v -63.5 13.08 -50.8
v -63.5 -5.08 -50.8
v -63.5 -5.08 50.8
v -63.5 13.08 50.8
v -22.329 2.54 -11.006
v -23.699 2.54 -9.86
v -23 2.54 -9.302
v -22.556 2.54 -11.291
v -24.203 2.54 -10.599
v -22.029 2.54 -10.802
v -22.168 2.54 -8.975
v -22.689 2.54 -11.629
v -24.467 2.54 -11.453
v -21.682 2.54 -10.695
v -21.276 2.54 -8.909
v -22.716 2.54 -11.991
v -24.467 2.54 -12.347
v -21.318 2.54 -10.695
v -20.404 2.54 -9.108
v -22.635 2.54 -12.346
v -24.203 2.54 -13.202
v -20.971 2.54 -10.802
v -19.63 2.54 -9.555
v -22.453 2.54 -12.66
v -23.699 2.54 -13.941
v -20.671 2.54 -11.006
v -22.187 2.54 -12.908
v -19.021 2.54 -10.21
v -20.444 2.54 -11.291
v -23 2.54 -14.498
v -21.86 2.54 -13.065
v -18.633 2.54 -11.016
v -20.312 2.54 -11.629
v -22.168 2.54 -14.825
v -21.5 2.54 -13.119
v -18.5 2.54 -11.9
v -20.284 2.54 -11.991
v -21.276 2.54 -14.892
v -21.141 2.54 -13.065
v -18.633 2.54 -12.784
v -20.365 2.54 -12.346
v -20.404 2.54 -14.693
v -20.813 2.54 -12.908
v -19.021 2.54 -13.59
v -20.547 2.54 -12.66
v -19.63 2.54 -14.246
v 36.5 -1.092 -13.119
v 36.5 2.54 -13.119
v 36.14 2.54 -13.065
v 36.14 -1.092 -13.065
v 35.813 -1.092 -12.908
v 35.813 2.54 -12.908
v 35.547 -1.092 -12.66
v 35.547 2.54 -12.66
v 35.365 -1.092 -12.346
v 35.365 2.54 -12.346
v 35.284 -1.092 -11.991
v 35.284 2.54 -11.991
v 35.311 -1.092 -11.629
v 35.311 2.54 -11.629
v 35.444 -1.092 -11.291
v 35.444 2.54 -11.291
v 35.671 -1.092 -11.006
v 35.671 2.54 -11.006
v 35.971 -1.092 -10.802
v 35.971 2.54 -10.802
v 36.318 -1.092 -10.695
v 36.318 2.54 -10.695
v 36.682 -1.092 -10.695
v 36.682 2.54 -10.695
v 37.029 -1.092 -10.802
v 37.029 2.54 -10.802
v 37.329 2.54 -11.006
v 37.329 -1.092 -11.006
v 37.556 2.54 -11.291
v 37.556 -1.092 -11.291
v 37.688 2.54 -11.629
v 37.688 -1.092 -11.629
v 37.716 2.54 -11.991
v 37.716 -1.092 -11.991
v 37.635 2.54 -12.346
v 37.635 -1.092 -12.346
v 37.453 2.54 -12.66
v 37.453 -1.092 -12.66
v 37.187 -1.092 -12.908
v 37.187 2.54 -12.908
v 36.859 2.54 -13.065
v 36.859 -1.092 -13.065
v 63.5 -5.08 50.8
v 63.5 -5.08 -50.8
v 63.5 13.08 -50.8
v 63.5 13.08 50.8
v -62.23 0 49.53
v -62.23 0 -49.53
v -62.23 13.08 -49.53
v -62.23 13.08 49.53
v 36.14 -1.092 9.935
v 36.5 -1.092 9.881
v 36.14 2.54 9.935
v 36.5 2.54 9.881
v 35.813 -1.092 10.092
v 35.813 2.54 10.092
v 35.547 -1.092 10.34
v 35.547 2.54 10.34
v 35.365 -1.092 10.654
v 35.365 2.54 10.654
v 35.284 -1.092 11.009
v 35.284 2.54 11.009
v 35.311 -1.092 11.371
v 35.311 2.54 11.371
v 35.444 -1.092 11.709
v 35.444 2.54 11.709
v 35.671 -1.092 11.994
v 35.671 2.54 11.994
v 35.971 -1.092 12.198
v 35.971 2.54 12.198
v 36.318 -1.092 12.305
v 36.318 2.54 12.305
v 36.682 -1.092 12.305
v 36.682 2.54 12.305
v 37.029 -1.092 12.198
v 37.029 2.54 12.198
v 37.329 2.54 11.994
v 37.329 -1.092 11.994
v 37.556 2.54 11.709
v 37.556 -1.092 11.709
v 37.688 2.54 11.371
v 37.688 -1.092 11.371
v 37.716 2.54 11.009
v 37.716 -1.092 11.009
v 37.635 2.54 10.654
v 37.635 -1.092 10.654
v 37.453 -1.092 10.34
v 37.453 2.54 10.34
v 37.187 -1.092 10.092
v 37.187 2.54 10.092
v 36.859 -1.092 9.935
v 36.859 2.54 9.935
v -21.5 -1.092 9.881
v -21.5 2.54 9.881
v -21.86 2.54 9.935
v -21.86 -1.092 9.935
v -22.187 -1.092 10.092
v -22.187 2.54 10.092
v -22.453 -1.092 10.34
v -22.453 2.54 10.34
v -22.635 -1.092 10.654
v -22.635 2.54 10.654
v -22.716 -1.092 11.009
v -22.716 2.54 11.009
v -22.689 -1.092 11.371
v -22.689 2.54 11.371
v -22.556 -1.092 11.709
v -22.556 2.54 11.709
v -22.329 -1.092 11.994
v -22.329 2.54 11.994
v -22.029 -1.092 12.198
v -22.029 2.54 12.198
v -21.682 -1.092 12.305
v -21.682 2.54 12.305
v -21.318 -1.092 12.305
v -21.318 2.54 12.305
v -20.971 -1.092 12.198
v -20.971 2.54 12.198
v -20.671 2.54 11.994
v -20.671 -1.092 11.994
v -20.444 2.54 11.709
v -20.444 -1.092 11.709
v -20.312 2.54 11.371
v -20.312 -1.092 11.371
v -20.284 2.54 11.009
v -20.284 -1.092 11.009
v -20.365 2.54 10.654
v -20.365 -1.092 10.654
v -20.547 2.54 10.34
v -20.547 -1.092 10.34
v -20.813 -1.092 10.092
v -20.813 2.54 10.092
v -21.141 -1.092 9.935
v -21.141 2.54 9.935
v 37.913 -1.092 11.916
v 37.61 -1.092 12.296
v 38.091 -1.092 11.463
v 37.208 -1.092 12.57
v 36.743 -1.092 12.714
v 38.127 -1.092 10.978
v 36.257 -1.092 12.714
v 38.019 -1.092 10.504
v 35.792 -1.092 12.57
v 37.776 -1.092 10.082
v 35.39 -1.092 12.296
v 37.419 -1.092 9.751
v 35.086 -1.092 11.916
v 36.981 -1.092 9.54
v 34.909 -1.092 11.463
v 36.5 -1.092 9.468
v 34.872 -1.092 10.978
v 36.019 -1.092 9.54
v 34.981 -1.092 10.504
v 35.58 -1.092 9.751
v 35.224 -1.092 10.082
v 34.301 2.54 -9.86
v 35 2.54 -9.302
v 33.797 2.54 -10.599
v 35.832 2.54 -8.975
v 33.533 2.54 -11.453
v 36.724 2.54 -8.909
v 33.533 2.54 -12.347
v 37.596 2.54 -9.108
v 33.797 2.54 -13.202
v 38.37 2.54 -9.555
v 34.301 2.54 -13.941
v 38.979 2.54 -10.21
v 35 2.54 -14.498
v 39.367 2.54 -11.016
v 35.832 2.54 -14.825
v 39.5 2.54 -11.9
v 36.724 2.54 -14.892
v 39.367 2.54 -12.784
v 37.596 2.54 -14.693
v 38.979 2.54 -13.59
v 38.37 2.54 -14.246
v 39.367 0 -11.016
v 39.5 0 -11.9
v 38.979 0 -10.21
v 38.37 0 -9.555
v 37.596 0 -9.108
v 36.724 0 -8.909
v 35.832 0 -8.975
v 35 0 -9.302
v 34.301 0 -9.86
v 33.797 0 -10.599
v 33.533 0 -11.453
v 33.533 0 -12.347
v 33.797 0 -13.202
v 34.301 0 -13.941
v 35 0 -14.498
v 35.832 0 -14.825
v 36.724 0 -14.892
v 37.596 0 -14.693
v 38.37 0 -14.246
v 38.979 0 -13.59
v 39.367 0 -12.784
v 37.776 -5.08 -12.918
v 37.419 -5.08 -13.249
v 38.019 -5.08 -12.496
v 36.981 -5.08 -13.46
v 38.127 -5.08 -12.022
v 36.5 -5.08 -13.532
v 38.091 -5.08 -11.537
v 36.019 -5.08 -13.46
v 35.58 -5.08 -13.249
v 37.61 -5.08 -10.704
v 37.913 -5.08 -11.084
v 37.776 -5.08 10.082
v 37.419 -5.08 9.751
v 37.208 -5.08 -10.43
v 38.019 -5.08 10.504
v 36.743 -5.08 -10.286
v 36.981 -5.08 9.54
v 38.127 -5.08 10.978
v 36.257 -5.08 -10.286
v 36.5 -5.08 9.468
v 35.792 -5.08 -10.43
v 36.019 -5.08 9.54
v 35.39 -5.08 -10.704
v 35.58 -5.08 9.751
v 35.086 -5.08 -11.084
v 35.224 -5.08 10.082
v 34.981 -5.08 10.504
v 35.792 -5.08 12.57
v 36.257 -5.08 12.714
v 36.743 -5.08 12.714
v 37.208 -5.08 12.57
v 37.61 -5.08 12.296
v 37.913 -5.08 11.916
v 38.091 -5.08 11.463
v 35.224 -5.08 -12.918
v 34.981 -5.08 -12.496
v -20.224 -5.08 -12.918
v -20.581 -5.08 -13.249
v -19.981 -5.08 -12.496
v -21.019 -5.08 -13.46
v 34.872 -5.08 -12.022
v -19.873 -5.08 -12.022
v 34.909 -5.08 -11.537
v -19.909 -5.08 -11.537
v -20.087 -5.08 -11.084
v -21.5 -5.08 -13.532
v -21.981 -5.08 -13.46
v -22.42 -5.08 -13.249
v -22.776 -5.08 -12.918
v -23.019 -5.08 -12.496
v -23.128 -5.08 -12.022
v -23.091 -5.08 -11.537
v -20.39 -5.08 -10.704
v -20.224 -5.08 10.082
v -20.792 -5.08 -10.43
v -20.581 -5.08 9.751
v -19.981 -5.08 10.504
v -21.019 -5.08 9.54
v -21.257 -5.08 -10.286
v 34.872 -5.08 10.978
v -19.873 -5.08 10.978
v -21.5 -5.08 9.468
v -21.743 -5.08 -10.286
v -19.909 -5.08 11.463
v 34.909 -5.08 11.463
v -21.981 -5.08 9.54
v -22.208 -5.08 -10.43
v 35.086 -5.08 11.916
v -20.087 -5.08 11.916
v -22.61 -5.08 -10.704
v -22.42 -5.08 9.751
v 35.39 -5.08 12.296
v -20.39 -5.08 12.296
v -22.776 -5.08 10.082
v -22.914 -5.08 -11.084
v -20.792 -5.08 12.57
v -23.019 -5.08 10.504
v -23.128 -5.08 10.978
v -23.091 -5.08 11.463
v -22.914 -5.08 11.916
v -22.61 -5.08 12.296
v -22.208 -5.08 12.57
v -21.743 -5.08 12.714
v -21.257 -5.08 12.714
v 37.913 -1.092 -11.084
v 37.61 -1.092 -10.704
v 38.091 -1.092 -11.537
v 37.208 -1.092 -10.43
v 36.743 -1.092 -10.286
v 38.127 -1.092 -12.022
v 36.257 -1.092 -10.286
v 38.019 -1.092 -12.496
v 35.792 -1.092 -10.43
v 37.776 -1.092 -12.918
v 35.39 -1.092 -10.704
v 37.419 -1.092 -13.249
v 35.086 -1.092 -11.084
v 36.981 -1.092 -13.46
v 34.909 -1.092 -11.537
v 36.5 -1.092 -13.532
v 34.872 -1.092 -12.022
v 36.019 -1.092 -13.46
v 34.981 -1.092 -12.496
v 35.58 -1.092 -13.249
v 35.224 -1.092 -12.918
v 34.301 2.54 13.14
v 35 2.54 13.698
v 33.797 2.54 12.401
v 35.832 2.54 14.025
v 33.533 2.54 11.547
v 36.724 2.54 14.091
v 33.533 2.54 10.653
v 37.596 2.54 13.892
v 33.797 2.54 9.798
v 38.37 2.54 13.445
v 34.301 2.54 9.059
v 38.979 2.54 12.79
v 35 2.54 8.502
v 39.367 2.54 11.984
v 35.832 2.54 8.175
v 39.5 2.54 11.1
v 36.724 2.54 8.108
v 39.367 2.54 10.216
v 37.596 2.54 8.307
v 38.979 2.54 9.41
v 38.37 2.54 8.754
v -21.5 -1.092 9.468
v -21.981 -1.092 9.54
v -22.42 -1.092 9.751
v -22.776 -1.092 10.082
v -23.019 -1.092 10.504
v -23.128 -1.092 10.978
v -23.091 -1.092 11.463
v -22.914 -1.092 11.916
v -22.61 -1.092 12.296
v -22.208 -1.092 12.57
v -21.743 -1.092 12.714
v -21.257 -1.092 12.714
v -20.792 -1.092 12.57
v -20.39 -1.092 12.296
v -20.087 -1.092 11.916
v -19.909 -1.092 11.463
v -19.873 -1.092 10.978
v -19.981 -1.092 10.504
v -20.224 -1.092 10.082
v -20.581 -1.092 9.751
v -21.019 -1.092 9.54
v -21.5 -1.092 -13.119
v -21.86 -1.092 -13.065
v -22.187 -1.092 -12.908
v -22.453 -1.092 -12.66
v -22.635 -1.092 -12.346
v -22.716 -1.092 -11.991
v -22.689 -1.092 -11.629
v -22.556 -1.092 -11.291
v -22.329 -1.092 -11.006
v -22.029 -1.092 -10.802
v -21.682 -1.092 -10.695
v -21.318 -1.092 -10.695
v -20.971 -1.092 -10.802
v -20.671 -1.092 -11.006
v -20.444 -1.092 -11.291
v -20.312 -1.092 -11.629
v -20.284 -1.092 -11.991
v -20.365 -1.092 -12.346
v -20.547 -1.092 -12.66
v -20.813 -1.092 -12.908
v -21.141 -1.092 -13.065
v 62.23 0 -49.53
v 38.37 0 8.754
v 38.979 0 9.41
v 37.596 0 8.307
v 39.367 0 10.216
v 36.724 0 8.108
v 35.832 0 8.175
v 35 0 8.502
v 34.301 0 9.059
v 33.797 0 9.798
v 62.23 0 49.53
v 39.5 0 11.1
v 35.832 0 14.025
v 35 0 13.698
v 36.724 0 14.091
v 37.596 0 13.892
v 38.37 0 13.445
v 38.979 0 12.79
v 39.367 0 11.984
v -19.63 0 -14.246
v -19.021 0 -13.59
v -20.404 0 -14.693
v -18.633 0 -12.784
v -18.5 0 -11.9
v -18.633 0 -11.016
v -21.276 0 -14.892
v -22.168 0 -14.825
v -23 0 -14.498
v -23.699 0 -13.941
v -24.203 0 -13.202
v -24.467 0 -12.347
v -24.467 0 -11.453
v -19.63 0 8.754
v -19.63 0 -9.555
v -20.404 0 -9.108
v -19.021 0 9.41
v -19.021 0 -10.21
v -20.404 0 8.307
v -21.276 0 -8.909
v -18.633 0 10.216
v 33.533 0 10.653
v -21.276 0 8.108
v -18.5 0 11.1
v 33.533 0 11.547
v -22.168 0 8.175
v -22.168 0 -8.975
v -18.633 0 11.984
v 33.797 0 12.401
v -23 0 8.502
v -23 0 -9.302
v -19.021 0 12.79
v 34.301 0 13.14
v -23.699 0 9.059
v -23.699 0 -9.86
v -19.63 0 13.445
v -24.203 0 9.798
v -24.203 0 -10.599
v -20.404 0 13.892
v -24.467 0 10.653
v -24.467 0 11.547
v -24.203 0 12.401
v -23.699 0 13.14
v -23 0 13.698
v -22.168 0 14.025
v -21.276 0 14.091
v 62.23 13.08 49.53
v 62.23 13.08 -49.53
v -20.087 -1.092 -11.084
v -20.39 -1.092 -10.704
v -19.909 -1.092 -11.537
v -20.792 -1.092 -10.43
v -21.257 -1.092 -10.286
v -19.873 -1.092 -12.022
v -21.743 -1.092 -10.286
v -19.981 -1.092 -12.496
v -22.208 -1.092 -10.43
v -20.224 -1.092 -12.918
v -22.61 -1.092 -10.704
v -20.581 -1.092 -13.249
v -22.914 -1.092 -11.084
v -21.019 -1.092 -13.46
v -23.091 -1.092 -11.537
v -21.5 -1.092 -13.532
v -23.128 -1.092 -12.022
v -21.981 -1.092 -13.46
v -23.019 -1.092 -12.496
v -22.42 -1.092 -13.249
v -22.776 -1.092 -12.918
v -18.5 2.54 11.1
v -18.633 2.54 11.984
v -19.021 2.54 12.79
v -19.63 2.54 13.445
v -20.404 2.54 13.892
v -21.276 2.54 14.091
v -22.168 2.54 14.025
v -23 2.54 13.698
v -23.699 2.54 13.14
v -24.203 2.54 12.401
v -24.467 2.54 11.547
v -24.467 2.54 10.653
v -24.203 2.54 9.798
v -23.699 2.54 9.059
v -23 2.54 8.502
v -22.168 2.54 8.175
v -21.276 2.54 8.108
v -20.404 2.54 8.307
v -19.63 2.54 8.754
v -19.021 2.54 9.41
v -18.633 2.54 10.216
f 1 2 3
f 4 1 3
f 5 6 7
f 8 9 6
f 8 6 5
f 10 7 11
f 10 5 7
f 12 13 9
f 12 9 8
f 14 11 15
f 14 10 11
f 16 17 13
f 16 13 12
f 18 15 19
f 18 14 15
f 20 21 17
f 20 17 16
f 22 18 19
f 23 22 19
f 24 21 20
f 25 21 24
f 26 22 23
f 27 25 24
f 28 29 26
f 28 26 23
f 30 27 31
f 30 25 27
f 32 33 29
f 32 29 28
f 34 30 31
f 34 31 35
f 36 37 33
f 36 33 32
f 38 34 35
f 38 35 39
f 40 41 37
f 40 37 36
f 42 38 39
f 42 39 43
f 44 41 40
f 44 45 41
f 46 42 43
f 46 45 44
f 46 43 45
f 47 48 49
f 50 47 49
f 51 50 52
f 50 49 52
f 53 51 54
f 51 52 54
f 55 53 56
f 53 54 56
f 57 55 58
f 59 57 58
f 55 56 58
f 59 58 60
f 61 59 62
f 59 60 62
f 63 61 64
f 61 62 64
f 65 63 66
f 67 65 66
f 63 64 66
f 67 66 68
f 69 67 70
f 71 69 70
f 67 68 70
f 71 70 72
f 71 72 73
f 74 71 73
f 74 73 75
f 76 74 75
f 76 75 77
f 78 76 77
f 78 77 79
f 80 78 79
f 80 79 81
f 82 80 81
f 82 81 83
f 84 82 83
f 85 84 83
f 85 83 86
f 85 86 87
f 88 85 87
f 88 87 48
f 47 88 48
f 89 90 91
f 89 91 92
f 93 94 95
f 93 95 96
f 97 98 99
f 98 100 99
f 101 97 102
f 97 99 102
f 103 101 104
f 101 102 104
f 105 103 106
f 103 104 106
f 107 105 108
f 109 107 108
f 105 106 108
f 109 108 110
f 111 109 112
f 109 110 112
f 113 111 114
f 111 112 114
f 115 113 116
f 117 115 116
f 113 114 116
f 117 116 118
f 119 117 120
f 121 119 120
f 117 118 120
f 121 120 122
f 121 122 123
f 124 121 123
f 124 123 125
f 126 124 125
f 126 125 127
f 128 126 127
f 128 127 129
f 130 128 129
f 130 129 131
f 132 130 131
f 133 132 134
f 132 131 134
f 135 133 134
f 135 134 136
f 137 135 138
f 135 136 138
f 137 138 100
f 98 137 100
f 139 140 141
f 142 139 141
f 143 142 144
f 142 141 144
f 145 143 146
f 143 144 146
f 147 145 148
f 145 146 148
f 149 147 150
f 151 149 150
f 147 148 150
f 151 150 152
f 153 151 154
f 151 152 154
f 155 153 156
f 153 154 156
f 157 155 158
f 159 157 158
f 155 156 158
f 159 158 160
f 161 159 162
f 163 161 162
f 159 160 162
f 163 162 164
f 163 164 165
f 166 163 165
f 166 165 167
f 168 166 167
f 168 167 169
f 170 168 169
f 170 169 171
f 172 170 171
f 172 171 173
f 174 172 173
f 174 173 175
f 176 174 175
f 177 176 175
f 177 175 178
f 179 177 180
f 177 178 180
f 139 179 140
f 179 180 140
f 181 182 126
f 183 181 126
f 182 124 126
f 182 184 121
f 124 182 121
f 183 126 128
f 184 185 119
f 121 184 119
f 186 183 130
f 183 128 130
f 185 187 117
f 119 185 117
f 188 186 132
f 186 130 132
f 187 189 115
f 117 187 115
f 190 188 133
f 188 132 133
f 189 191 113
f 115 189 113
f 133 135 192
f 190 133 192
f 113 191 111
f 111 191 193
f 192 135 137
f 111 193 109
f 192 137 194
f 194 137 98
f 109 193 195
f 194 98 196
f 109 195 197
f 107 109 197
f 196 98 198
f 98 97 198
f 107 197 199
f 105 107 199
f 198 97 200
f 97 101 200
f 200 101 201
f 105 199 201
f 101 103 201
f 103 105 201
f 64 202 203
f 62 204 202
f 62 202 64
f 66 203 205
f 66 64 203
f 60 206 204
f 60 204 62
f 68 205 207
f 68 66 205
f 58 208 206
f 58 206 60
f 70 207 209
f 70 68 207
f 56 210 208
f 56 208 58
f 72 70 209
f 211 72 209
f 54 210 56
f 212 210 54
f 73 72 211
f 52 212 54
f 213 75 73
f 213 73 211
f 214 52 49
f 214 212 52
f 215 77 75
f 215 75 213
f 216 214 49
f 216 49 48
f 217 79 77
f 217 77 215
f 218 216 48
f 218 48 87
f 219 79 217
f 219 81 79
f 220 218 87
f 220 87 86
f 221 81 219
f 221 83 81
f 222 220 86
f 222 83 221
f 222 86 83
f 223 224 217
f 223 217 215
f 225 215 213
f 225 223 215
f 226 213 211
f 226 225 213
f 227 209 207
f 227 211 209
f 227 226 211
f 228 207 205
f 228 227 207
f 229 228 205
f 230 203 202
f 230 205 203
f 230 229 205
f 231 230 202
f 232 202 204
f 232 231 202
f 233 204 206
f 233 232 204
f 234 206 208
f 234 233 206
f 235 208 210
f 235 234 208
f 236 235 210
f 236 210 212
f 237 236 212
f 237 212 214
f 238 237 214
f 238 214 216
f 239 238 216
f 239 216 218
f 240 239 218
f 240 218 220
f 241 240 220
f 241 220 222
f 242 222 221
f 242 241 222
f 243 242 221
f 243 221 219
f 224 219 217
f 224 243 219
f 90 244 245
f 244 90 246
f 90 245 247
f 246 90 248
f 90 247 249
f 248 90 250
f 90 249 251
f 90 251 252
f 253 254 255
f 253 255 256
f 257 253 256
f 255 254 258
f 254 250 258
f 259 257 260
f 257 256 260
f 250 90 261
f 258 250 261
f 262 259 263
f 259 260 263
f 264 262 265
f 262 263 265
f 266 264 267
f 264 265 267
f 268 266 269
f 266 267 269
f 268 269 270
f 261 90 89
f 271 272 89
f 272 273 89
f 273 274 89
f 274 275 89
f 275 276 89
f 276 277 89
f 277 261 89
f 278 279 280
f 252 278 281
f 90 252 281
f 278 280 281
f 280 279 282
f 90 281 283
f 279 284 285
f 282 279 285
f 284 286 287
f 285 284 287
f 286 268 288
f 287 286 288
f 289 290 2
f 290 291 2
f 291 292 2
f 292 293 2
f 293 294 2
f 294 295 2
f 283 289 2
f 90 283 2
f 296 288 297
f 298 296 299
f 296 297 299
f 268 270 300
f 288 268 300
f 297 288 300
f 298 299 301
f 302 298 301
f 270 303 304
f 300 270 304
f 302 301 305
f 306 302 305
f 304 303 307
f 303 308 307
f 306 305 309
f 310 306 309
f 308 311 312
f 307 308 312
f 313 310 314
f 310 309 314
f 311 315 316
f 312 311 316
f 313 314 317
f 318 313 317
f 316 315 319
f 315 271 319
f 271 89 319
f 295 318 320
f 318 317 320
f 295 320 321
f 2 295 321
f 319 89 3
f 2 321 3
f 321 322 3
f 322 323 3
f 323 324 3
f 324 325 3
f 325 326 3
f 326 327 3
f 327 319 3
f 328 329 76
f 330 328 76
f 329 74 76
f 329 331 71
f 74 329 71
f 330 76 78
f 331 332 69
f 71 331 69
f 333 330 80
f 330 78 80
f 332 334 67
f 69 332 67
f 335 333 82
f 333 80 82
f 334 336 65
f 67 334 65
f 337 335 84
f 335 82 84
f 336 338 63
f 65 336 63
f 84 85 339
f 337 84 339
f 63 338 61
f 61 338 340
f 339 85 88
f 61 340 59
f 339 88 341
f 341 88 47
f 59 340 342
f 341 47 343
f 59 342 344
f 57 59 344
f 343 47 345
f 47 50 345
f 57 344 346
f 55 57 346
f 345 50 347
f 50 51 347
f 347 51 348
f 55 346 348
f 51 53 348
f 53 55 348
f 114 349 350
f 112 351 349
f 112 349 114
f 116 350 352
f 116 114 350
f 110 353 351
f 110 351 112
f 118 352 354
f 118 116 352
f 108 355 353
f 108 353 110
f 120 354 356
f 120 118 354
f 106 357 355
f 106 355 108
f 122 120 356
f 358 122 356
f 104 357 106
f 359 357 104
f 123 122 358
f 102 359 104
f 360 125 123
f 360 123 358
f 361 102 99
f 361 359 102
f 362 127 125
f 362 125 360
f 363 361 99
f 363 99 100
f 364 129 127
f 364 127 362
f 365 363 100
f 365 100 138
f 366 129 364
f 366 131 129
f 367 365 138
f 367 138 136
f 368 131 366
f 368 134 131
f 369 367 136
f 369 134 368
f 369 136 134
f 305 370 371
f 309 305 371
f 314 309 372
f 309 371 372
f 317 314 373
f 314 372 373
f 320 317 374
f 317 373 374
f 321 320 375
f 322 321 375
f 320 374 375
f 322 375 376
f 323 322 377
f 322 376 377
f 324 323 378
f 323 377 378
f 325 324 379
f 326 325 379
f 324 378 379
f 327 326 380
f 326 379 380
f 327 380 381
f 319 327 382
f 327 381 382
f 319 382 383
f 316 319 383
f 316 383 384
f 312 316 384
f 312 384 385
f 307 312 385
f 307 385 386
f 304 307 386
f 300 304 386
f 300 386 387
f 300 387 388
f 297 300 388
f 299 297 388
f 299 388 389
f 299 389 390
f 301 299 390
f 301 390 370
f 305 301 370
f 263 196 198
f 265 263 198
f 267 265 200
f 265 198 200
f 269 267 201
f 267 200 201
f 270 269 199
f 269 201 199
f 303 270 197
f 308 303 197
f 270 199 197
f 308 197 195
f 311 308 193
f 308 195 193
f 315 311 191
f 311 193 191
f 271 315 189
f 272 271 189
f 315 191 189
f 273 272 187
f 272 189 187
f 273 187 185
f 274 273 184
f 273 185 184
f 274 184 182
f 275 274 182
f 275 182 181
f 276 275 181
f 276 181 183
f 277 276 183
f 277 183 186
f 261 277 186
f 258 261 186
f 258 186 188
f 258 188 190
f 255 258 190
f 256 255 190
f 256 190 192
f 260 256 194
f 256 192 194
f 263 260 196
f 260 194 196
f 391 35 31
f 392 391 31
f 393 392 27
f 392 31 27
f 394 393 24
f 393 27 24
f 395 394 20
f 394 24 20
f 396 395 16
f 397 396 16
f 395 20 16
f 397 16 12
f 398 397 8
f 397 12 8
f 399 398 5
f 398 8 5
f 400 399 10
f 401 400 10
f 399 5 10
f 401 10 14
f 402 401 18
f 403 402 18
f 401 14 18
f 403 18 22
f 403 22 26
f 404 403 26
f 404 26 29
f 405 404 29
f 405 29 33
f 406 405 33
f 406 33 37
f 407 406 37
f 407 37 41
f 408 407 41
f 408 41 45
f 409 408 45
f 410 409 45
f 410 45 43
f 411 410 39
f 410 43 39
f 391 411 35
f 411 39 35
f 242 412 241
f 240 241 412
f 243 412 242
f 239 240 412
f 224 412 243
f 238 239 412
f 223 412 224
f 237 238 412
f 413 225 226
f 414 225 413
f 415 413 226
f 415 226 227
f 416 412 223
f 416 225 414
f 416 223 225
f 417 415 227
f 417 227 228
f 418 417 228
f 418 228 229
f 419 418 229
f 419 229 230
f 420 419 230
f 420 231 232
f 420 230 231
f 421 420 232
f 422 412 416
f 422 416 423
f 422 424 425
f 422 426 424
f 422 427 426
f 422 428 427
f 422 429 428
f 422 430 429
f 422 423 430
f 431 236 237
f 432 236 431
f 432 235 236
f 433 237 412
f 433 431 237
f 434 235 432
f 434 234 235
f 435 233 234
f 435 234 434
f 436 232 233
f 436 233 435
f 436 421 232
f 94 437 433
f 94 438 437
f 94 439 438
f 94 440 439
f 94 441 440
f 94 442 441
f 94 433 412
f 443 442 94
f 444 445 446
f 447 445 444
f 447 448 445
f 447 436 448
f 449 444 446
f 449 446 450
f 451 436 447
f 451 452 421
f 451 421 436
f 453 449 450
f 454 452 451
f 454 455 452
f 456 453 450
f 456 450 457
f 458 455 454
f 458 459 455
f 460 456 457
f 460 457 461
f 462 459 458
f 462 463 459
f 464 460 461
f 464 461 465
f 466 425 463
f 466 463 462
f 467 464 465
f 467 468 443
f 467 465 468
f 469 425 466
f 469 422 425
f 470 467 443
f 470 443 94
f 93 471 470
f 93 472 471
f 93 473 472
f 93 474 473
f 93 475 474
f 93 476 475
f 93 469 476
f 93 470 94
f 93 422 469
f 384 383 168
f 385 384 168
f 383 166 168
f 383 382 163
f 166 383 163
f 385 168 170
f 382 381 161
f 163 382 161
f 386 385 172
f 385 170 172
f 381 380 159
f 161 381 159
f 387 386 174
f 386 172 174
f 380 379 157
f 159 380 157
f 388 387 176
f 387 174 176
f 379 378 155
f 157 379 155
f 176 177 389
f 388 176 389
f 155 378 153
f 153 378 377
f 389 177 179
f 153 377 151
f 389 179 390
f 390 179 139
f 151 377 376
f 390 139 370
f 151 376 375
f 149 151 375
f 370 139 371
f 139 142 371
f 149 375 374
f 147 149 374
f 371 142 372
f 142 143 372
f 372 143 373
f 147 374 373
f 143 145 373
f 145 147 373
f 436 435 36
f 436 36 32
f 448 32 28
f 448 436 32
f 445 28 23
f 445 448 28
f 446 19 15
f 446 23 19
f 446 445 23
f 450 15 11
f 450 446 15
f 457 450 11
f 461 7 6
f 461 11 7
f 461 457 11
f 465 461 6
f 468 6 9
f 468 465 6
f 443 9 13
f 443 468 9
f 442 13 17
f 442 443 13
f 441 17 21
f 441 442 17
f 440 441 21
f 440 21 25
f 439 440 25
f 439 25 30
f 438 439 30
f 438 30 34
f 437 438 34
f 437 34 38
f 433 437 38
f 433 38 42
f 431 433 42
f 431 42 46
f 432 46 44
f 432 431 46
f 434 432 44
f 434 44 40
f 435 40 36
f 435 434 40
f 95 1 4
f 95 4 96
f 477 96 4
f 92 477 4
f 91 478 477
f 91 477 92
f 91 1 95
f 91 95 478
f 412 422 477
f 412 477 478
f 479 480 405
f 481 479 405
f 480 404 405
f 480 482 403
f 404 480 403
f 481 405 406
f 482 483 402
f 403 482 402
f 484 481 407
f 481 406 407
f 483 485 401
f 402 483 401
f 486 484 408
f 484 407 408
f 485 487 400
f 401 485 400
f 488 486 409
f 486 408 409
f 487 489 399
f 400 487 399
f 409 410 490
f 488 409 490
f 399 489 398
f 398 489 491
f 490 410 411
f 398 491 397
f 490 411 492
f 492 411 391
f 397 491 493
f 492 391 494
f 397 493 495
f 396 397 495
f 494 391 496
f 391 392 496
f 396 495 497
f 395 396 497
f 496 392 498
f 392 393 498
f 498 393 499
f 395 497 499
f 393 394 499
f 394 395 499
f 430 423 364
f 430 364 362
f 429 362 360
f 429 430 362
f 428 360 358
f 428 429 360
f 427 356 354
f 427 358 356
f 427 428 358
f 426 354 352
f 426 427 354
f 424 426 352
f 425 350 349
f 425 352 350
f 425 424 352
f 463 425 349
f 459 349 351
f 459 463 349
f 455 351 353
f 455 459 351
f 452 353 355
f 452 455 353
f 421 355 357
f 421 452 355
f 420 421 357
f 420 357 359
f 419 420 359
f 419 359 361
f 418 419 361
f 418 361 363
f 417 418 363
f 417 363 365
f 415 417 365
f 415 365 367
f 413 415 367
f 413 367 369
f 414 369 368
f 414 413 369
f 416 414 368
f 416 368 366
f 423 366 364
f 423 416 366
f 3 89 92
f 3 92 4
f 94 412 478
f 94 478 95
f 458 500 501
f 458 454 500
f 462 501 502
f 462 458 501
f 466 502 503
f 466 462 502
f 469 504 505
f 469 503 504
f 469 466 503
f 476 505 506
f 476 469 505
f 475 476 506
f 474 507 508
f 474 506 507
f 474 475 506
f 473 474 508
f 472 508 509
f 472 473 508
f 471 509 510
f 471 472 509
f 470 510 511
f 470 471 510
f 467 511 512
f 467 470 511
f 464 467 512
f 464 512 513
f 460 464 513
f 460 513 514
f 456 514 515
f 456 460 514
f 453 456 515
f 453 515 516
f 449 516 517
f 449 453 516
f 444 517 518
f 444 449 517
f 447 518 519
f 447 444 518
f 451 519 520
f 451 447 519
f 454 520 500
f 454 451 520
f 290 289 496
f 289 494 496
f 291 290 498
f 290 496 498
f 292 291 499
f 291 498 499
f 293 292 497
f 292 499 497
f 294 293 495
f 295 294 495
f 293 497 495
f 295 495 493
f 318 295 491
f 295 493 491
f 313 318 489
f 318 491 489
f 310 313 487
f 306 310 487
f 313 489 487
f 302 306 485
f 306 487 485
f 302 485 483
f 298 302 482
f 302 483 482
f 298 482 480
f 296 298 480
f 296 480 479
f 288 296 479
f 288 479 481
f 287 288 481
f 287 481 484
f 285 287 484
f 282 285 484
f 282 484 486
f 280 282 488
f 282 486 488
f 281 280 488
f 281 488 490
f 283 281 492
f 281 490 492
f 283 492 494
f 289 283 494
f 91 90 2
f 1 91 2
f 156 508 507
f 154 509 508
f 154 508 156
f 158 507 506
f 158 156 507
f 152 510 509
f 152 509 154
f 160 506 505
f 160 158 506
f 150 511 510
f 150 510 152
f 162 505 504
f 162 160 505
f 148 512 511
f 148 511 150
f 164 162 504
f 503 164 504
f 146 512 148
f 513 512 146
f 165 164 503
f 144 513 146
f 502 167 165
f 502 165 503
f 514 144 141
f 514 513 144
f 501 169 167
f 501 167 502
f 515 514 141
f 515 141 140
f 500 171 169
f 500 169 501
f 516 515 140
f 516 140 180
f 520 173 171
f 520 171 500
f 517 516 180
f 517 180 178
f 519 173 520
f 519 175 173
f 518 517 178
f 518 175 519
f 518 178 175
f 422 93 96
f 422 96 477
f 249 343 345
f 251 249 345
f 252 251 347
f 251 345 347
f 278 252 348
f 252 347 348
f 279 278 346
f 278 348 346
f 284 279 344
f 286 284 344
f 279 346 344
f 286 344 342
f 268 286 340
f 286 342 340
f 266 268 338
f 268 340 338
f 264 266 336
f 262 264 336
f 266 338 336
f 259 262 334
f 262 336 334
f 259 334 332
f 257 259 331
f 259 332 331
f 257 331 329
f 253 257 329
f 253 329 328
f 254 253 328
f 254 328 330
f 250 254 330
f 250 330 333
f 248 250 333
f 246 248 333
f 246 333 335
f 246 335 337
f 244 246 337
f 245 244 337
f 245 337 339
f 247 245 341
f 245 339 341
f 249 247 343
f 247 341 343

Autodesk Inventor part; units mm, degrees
ref_plane "YZ Plane" through (0, 0, 0) normal (1, 0, 0) x (0, 1, 0)
ref_plane "XZ Plane" through (0, 0, 0) normal (0, 1, 0) x (-1, 0, 0)
ref_plane "XY Plane" through (0, 0, 0) normal (0, 0, 1) x (1, 0, 0)
sketch "Sketch1" plane through (0, 0, 0) normal (0, 1, 0) x (-1, 0, 0)
  line L0 (63.5, 50.8) -> (-63.5, 50.8)
  line L1 (-63.5, 50.8) -> (-63.5, -50.8)
  line L2 (-63.5, -50.8) -> (63.5, -50.8)
  line L3 (63.5, -50.8) -> (63.5, 50.8)
  line L4 (63.5, 50.8) -> (-63.5, -50.8) construction
  line L5 (-63.5, 50.8) -> (63.5, -50.8) construction
  point P0 (0, 0)
  dimension "d0" = 127
  dimension "d1" = 101.6
extrude "Extrusion1" add sketch "Sketch1" against normal blind 5.08
sketch "Sketch26" plane through (0, 0, 0) normal (0, 1, 0) x (1, 0, 0)
  line L0 (-21.5002, -11.0998) -> (36.4998, -11.0998) construction
  line L1 (36.4998, -11.0998) -> (36.4998, 11.9002) construction
  line L2 (36.4998, 11.9002) -> (-21.5002, 11.9002) construction
  line L3 (-21.5002, 11.9002) -> (-21.5002, -11.0998) construction
  line L4 (-63.5, -50.8) -> (63.5, -50.8) construction
  line L5 (63.5, -50.8) -> (-63.5, -50.8) construction
  circle A0 centre (-21.5002, -11.0998) radius 3
  circle A1 centre (-21.5002, 11.9002) radius 3
  circle A2 centre (36.4998, 11.9002) radius 3
  circle A3 centre (36.4998, -11.0998) radius 3
  line L6 (63.5, -50.8) -> (63.5, 50.8) projected
  line L7 (-21.5002, 0.4002) -> (36.4998, 0.4002) construction
  point P0 (0, 0)
  dimension "d173" = 58
  dimension "d174" = 23
  dimension "d175" = 39.7002
  dimension "d176" = 6
  dimension "d190" = 27.0002
  dimension "piZeroCenterLine" = 0.4002
extrude "Extrusion12" add sketch "Sketch26" along normal blind 2.54
sketch "Sketch27" plane through (0, -5.08, 0) normal (0, -1, 0) x (1, 0, 0)
  circle A0 centre (-21.5002, 11.0998) radius 3 projected
  circle A1 centre (-21.5002, -11.9002) radius 3 projected
  circle A2 centre (36.4998, -11.9002) radius 3 projected
  circle A3 centre (36.4998, 11.0998) radius 3 projected
  point P0 (0, 0)
hole "Hole17" at (-21.5002, -5.08, 11.0998) at (36.4998, -5.08, 11.0998) at (36.4998, -5.08, -11.9002) at (-21.5002, -5.08, -11.9002) direction (0, 1, 0) diameter 2.4384 end through all counterbore diameter 3.2639 counterbore depth 3.9878
sketch "Sketch28" plane through (0, 0, 0) normal (0, 1, 0) x (1, 0, 0)
  line L0 (63.5, -50.8) -> (-63.5, -50.8) projected
  line L1 (63.5, 50.8) -> (63.5, -50.8) projected
  line L2 (-63.5, -50.8) -> (63.5, -50.8)
  line L3 (63.5, -50.8) -> (63.5, 50.8)
  line L4 (63.5, 50.8) -> (-63.5, 50.8)
  line L5 (-63.5, 50.8) -> (-63.5, -50.8)
  line L6 (-62.23, -49.53) -> (62.23, -49.53)
  line L7 (62.23, -49.53) -> (62.23, 49.53)
  line L8 (62.23, 49.53) -> (-62.23, 49.53)
  line L9 (-62.23, 49.53) -> (-62.23, -49.53)
  line L10 (-62.23, -49.53) -> (62.23, 49.53) construction
  line L11 (62.23, -49.53) -> (-62.23, 49.53) construction
  point P0 (0, 0)
  dimension "d186" = 1.27
  dimension "d187" = 1.27
extrude "Extrusion13" add sketch "Sketch28" along normal blind 13.08
sketch "Sketch22" plane through (0, -5.08, 0) normal (0, -1, 0) x (1, 0, 0)
  point P0 (34.92, -17.42)
  point P1 (34.92, 17.42)
  point P2 (-34.92, 17.42)
  point P3 (-34.92, -17.42)
equation "\"d0\" = LargeCaseLength"
equation "\"d1\" = LargeCaseWidth"
equation "\"d2\" = CaseFloorThickness"
equation "\"d173\" = PiZeroMoutingHolesLength"
equation "\"d174\" = PiZeroMountingHolesWidth"
equation "\"d175\" = PiZeroHolesDistanceFromSideWall"
equation "\"d176\" = PiZeroHoleSupport"
equation "\"d190\" = PiZeroHolesDistanceFromBottomWall"
equation "\"d177\" = PiZeroWHoleHeight"
equation "\"d186\" = CaseWallThickness"
equation "\"d187\" = CaseWallThickness"
equation "\"d188\" = CaseHeight"
equation "\"PiZeroWLength\" = 65"
equation "\"PiZeroWWidth\" = 30"
equation "\"CaseLength\" = PiZeroWLength + 2 * EndOfCaseToStartOfPiZero"
equation "\"CaseWidth\" = PiZeroWWidth + 2 * EndOfCaseToStartOfPiZero"
equation "\"PiZeroWMountingHole\" = 2.75"
equation "\"CaseWallThickness\" = 1.27"
equation "\"CaseFloorThickness\" = 5.08"
equation "\"PiZeroMoutingHolesLength\" = 58"
equation "\"PiZeroMountingHolesWidth\" = 23"
equation "\"PiZeroHoleSupport\" = 6"
equation "\"PiZeroWHoleHeight\" = 2.54"
equation "\"PiRibbonCableWidth\" = 20"
equation "\"PiRibbonCableThickness\" = 5"
equation "\"HdmiCenter\" = 19"
equation "\"MiniUsbCenter\" = 41.4"
equation "\"PowerCenter\" = 54"
equation "\"HdmiWidth\" = 28"
equation "\"MiniUsbWidth\" = 18"
equation "\"PowerWidth\" = 20"
equation "\"EndOfCaseToStartOfPiZero\" = 7.5"
equation "\"EyepieceOutsideDiameter\" = 31.75"
equation "\"EyepieceWallThickness\" = 1.905"
equation "\"EyepieceInnerDiameter\" = EyepieceOutsideDiameter - 2 * EyepieceWallThickness"
equation "\"HeightOfConnectorHolesAboveBottom\" = 6"
equation "\"HdmiHightAboveBottom\" = 6"
equation "\"MiniUsbHeightAboveBottom\" = 5"
equation "\"PowerHeightAboveBottom\" = 5"
equation "\"PiRibbonCableHeightFromTp\" = 8.89"
equation "\"NutHeightPlusOffset\" = 1.8415"
equation "\"NutWidthPlusOffset\" = 5.0165"
equation "\"LargeCaseWidth\" = 101.6"
equation "\"LargeCaseLength\" = 127"
equation "\"CameraHoleLength\" = 12.58"
equation "\"CameraHoleWidth\" = 21"
equation "\"PiZeroHolesDistanceFromSideWall\" = 39.7002"
equation "\"PiZeroHolesDistanceFromBottomWall\" = 27.0002"
equation "\"CaseHeight\" = 13.08"
properties part number "LargeCaseCaseBottomForPiZeroWV02" material "LCP Plastic"
